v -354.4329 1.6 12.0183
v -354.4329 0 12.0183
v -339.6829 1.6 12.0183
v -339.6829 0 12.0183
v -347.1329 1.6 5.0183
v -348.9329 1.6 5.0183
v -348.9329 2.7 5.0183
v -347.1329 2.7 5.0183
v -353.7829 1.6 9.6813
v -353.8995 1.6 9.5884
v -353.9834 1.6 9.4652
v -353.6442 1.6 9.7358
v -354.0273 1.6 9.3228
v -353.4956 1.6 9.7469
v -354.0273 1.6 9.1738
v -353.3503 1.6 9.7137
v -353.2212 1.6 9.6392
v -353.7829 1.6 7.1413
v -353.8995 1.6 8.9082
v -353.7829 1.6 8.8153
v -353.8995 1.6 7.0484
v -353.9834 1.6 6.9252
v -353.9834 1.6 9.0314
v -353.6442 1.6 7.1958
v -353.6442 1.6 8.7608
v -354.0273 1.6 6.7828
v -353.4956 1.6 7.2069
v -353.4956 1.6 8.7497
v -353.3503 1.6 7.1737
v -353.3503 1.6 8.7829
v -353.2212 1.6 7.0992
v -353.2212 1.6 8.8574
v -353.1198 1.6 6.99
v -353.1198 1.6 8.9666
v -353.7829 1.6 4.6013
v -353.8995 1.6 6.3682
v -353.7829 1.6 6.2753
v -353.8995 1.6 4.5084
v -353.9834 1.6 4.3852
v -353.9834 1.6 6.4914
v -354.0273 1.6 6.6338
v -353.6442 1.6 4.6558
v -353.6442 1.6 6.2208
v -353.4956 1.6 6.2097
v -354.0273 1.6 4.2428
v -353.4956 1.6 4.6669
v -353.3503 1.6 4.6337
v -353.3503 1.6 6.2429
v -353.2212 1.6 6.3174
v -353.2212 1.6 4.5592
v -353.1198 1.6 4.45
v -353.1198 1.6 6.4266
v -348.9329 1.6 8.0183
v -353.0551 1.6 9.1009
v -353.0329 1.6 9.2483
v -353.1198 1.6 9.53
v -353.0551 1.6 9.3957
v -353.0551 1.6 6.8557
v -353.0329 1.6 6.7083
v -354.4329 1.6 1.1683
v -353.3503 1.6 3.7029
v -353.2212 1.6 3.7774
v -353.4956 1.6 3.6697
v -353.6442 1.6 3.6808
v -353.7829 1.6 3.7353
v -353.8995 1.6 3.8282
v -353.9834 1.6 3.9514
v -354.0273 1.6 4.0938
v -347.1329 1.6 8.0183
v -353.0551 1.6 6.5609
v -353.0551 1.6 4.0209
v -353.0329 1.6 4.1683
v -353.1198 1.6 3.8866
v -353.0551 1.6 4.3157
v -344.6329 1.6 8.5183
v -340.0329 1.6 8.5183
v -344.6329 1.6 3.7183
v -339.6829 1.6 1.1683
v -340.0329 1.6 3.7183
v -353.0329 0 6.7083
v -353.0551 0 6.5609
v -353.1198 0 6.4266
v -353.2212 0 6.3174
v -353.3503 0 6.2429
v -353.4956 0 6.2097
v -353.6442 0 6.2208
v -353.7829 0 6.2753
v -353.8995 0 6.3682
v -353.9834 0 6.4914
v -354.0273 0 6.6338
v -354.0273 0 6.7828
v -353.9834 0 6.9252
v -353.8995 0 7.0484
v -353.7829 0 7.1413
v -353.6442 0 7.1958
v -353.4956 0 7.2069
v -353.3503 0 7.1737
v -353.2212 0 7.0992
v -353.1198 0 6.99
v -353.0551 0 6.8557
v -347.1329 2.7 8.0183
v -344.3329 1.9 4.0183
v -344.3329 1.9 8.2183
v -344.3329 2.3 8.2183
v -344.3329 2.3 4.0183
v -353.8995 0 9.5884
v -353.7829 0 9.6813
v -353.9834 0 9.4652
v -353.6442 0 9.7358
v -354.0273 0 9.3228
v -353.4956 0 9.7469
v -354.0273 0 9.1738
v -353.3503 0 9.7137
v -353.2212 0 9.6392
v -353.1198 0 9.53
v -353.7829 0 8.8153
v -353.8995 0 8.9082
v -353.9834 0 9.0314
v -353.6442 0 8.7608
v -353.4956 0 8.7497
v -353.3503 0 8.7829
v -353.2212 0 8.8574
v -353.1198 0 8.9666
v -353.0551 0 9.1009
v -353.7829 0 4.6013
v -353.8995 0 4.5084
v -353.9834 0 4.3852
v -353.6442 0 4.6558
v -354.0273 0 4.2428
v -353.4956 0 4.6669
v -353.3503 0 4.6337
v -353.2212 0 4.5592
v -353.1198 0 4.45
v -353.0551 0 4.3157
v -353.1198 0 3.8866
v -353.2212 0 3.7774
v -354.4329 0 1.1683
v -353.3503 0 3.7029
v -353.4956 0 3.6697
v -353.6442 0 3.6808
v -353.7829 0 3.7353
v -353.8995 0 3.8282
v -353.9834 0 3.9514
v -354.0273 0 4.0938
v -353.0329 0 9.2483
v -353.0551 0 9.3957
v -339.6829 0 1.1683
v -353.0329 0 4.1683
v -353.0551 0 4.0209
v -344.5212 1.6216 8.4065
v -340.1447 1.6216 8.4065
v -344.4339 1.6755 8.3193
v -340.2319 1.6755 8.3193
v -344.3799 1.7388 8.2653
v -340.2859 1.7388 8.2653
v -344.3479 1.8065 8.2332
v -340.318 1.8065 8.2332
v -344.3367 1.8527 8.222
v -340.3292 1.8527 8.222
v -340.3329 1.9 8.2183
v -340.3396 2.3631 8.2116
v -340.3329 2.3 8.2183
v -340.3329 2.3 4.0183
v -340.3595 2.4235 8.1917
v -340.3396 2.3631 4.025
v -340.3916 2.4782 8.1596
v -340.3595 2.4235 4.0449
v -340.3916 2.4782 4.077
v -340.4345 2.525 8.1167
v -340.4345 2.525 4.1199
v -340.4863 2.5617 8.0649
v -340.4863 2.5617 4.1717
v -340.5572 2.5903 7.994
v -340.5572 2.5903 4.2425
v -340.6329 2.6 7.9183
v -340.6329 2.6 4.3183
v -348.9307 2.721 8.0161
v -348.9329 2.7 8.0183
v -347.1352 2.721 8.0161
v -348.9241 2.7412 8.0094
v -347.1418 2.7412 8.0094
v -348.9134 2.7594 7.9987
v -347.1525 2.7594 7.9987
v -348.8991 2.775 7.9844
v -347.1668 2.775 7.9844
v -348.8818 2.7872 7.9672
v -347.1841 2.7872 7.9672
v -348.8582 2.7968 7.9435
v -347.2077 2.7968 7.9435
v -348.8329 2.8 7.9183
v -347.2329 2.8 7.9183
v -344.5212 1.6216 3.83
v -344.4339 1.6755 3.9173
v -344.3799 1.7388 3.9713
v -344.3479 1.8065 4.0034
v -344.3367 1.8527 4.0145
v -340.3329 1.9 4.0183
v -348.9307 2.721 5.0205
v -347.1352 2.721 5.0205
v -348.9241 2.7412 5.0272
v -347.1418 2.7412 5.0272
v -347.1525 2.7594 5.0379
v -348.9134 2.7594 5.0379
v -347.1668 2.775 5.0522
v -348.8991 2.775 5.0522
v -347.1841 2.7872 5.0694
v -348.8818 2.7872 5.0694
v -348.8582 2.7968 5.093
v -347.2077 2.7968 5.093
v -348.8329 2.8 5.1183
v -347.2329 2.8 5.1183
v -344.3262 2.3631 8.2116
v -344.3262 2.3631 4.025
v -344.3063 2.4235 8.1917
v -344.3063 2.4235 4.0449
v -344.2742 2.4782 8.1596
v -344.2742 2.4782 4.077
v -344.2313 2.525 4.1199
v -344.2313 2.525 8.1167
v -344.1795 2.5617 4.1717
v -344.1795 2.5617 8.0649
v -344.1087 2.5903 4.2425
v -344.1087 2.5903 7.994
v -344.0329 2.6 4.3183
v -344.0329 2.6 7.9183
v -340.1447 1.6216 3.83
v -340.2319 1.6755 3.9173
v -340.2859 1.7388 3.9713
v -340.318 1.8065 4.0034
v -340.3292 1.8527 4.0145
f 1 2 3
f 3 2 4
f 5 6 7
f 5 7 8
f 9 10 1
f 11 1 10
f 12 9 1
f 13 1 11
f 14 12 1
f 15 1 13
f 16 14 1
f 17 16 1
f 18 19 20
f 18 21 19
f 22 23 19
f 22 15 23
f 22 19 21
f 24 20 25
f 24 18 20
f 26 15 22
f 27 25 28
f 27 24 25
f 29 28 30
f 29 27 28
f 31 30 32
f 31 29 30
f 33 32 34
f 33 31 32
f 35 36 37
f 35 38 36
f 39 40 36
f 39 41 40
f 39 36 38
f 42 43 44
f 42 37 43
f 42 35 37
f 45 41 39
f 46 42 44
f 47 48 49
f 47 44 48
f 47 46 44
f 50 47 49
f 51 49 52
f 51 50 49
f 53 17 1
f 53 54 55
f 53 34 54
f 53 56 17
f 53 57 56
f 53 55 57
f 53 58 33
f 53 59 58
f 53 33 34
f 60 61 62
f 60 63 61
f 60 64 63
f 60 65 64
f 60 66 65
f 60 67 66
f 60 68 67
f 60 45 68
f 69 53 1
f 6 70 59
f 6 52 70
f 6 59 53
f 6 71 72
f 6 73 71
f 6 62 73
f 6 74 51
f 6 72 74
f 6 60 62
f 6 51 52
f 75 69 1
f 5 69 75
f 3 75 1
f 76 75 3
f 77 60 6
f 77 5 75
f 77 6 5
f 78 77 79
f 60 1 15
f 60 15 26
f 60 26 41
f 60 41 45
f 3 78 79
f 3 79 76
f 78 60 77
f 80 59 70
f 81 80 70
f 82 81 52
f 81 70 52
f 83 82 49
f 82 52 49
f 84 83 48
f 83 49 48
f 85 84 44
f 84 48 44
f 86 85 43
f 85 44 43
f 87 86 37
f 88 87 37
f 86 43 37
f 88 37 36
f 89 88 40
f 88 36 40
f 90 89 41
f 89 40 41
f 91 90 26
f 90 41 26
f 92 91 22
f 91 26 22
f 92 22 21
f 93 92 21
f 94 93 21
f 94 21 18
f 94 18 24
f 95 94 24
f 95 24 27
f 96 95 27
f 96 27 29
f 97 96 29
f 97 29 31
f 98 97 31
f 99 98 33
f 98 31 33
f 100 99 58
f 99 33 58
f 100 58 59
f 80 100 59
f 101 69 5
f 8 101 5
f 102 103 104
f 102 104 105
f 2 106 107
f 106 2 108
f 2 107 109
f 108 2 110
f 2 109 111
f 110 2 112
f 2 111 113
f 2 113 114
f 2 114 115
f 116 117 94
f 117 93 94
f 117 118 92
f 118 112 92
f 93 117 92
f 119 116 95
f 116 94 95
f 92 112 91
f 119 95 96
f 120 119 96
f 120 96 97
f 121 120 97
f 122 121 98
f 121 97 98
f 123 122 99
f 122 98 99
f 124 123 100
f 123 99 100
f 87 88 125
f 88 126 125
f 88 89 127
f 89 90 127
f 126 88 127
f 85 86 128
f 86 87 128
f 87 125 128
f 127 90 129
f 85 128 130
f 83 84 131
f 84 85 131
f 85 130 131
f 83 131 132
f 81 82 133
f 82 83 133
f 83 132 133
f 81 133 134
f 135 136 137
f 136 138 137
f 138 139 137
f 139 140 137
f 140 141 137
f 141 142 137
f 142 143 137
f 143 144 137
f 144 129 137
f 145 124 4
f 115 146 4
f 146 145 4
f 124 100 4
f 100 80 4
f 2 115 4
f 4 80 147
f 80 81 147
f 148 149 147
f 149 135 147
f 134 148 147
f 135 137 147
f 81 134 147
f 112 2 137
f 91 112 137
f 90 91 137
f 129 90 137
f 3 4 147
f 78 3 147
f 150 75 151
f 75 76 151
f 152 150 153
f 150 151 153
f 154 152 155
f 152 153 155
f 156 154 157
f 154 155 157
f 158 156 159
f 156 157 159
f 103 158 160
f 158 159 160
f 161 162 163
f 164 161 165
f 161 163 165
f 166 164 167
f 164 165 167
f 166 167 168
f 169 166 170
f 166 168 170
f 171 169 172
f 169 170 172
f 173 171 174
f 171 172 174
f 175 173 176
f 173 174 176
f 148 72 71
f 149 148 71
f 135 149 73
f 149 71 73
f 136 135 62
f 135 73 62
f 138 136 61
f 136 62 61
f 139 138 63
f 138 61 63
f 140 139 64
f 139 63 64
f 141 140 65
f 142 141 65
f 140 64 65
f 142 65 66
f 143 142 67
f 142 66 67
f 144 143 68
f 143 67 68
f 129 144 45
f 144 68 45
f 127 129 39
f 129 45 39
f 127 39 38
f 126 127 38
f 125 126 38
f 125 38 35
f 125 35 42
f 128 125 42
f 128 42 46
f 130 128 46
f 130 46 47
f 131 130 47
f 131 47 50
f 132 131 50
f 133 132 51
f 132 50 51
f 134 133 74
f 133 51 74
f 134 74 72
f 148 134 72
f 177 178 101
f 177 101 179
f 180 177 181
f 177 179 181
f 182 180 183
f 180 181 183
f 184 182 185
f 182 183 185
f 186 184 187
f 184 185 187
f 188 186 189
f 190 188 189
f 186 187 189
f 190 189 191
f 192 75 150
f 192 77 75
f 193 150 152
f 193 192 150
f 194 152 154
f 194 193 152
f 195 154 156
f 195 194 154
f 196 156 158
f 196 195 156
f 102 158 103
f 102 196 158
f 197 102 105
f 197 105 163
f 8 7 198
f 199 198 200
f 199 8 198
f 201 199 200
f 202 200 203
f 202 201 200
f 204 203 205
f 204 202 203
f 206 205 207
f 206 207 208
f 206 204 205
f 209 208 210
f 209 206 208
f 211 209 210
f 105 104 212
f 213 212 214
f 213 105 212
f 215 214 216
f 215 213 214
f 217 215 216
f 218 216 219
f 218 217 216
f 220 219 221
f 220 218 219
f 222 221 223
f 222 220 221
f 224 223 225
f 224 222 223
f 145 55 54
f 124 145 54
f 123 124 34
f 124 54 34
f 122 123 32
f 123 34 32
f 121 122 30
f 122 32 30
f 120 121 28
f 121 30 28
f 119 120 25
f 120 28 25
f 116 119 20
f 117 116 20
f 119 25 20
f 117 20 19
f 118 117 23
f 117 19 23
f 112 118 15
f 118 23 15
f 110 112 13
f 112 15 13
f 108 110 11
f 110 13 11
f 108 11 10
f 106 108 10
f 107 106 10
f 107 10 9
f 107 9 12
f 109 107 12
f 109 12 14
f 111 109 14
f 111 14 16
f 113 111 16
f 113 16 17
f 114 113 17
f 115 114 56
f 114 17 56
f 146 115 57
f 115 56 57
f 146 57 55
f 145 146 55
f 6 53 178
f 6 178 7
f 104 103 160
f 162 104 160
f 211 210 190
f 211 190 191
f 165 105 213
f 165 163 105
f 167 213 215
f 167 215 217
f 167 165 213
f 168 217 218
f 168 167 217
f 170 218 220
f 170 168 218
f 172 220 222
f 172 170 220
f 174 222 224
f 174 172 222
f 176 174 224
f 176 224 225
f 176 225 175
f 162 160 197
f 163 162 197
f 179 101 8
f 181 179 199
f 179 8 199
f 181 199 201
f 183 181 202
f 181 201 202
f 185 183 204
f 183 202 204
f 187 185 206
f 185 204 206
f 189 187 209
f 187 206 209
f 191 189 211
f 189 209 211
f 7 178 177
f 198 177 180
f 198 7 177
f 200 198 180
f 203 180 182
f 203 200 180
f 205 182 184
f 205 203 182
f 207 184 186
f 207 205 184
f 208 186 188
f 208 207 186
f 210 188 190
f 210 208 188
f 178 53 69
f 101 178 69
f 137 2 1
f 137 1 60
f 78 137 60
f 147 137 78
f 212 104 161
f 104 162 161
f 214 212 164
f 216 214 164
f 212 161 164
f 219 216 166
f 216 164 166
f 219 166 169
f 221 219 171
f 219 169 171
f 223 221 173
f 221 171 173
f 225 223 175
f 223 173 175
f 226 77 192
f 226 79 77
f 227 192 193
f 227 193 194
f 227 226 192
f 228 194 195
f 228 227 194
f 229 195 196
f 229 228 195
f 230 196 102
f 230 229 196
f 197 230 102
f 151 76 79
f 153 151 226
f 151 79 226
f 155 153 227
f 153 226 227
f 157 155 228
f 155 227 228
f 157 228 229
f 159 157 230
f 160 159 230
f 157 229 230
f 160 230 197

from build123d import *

# Parameters (mm, degrees)
SKETCH1_W        = 14.75
SKETCH1_H        = 10.85
MIC_BOARD_DEPTH  = 1.6
SKETCH2_R        = 0.5
PINS_DEPTH       = 1.6
MIC_SKETCH_W     = 4
MIC_SKETCH_H     = 4.2
MICROPHONE_DEPTH = 1
OP_AMP_SKETCH_W  = 1.8
OP_AMP_SKETCH_H  = 3
OP_AMP_DEPTH     = 1.2
MIC_FILLET_R     = 0.3
OP_AMP_FILLET_R  = 0.1


with BuildPart() as part:
    # Sketch1 → Mic Board (new body)
    with BuildSketch(Plane(origin=(0, 0, 0), x_dir=(1, 0, 0), z_dir=(0, 1, 0))):
        with Locations((-347.05792854, -6.593292201)):
            Rectangle(SKETCH1_W, SKETCH1_H)
    extrude(amount=MIC_BOARD_DEPTH)

    # Sketch2 → Pins (cut)
    with BuildSketch(Plane(origin=(0, 1.6, 0), x_dir=(1, 0, 0), z_dir=(0, 1, 0))):
        with Locations((-353.53292854, -4.168292201)):
            Circle(SKETCH2_R)
        with Locations((-353.53292854, -6.708292201)):
            Circle(SKETCH2_R)
        with Locations((-353.53292854, -9.248292201)):
            Circle(SKETCH2_R)
    extrude(amount=-PINS_DEPTH, mode=Mode.SUBTRACT)

    # mic Sketch → Microphone (add)
    with BuildSketch(Plane(origin=(0, 1.6, 0), x_dir=(1, 0, 0), z_dir=(0, 1, 0))):
        with Locations((-342.33292854, -6.118292201)):
            Rectangle(MIC_SKETCH_W, MIC_SKETCH_H)
    extrude(amount=MICROPHONE_DEPTH)

    # Op Amp Sketch → Op Amp (add)
    with BuildSketch(Plane(origin=(0, 1.6, 0), x_dir=(1, 0, 0), z_dir=(0, 1, 0))):
        with Locations((-348.03292854, -6.518292201)):
            Rectangle(OP_AMP_SKETCH_W, OP_AMP_SKETCH_H)
    extrude(amount=OP_AMP_DEPTH)

    # Mic Fillet
    mic_fillet_edges = [part.edges().sort_by_distance(p)[0] for p in [
        (-342.33292854, 2.6, 4.018292201),
        (-344.33292854, 1.6, 6.118292201),
        (-342.33292854, 1.6, 8.218292201),
        (-340.33292854, 2.6, 6.118292201),
        (-344.33292854, 2.6, 6.118292201),
        (-342.33292854, 2.6, 8.218292201),
        (-342.33292854, 1.6, 4.018292201),
        (-340.33292854, 1.6, 6.118292201),
    ]]
    fillet(mic_fillet_edges, radius=MIC_FILLET_R)

    # Op Amp Fillet
    op_amp_fillet_edges = [part.edges().sort_by_distance(p)[0] for p in [
        (-348.93292854, 2.8, 6.518292201),
        (-348.03292854, 2.8, 8.018292201),
        (-347.13292854, 2.8, 6.518292201),
        (-348.03292854, 2.8, 5.018292201),
    ]]
    fillet(op_amp_fillet_edges, radius=OP_AMP_FILLET_R)


solid = part.part
